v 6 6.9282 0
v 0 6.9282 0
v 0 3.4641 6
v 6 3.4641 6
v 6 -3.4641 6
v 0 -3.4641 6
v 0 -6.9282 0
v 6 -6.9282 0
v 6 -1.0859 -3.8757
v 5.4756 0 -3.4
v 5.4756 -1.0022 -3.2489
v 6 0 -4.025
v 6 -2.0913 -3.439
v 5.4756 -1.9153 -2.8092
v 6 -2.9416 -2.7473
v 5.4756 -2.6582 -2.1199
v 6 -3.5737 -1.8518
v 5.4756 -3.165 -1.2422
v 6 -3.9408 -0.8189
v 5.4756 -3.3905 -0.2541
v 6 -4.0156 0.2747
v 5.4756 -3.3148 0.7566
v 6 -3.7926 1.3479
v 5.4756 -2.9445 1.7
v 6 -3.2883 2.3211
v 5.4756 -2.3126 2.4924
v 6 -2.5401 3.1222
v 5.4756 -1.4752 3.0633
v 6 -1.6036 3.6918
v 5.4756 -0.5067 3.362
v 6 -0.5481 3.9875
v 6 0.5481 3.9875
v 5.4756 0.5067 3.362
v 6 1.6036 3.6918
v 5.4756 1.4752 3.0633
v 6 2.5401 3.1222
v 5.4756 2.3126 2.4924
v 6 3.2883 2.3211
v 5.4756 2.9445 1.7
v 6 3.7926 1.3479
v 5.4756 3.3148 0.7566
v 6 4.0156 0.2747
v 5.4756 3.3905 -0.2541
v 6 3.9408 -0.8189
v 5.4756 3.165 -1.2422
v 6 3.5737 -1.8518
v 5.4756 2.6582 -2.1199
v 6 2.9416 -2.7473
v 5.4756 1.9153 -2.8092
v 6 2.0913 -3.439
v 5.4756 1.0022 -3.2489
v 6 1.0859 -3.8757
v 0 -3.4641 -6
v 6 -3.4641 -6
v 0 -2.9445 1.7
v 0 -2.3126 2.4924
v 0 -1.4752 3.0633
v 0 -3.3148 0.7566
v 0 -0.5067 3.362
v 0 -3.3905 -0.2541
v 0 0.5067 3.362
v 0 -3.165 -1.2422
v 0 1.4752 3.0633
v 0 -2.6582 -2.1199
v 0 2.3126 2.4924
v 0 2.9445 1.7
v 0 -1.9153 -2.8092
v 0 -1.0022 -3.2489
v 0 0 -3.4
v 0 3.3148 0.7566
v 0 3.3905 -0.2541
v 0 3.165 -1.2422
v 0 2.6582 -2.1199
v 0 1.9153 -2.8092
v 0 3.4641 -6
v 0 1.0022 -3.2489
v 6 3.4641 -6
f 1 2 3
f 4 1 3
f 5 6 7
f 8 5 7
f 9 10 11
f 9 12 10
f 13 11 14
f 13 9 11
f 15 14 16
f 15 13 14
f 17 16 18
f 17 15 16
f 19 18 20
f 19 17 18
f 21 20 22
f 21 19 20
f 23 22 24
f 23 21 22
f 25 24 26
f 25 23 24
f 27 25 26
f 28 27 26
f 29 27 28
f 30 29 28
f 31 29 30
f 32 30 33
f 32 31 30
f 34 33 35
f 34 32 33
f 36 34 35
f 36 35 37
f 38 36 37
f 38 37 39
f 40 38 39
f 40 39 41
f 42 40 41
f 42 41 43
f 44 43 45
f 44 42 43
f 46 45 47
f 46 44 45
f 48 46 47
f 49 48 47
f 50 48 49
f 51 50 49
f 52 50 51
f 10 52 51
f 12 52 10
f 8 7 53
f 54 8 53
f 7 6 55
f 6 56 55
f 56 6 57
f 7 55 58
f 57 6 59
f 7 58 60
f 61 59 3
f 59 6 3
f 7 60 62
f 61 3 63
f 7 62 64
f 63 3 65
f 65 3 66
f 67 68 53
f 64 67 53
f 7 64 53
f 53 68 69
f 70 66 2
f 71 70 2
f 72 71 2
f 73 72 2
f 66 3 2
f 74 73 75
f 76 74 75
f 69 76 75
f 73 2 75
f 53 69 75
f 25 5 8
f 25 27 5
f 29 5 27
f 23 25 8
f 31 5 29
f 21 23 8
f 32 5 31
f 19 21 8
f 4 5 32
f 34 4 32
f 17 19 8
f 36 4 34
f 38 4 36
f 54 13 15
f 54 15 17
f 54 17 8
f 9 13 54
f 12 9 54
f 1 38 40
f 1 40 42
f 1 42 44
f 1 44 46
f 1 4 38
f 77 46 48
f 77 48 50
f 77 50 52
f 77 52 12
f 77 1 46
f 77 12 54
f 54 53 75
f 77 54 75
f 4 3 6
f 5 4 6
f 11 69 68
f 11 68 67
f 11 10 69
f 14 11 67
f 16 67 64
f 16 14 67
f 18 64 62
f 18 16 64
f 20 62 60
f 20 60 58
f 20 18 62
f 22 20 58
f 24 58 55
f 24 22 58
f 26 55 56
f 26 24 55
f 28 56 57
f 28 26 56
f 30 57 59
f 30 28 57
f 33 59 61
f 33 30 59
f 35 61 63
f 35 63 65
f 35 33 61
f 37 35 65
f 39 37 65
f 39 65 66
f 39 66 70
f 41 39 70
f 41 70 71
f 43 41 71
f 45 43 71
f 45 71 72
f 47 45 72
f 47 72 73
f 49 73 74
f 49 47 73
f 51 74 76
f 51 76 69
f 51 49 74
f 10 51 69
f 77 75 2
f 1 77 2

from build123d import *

# Parameters (mm, degrees)
EXTRUDE_1_DEPTH = 6


with BuildPart() as part:
    # 草图2 → 凸台-拉伸1 (new body)
    with BuildSketch(Plane(origin=(0, 0, 0), x_dir=(0, 0, -1), z_dir=(1, 0, 0))):
        Polygon((6, -3.464101615), (6, 3.464101615), (0, 6.92820323), (-6, 3.464101615), (-6, -3.464101615), (0, -6.92820323), align=None)
    extrude(amount=EXTRUDE_1_DEPTH)

    # 草图4 → M8 螺纹孔1 (revolve, cut)
    with BuildSketch(Plane(origin=(6, 0, 0), x_dir=(0, 0, -1), z_dir=(0, 1, 0))):
        Polygon((0, 0), (0, 6), (3.4, 6), (3.4, 0.524437269), (4.025, 0), align=None)
    revolve(axis=Axis((12.35, 0, 0), (-1, 0, 0)), mode=Mode.SUBTRACT)


solid = part.part
